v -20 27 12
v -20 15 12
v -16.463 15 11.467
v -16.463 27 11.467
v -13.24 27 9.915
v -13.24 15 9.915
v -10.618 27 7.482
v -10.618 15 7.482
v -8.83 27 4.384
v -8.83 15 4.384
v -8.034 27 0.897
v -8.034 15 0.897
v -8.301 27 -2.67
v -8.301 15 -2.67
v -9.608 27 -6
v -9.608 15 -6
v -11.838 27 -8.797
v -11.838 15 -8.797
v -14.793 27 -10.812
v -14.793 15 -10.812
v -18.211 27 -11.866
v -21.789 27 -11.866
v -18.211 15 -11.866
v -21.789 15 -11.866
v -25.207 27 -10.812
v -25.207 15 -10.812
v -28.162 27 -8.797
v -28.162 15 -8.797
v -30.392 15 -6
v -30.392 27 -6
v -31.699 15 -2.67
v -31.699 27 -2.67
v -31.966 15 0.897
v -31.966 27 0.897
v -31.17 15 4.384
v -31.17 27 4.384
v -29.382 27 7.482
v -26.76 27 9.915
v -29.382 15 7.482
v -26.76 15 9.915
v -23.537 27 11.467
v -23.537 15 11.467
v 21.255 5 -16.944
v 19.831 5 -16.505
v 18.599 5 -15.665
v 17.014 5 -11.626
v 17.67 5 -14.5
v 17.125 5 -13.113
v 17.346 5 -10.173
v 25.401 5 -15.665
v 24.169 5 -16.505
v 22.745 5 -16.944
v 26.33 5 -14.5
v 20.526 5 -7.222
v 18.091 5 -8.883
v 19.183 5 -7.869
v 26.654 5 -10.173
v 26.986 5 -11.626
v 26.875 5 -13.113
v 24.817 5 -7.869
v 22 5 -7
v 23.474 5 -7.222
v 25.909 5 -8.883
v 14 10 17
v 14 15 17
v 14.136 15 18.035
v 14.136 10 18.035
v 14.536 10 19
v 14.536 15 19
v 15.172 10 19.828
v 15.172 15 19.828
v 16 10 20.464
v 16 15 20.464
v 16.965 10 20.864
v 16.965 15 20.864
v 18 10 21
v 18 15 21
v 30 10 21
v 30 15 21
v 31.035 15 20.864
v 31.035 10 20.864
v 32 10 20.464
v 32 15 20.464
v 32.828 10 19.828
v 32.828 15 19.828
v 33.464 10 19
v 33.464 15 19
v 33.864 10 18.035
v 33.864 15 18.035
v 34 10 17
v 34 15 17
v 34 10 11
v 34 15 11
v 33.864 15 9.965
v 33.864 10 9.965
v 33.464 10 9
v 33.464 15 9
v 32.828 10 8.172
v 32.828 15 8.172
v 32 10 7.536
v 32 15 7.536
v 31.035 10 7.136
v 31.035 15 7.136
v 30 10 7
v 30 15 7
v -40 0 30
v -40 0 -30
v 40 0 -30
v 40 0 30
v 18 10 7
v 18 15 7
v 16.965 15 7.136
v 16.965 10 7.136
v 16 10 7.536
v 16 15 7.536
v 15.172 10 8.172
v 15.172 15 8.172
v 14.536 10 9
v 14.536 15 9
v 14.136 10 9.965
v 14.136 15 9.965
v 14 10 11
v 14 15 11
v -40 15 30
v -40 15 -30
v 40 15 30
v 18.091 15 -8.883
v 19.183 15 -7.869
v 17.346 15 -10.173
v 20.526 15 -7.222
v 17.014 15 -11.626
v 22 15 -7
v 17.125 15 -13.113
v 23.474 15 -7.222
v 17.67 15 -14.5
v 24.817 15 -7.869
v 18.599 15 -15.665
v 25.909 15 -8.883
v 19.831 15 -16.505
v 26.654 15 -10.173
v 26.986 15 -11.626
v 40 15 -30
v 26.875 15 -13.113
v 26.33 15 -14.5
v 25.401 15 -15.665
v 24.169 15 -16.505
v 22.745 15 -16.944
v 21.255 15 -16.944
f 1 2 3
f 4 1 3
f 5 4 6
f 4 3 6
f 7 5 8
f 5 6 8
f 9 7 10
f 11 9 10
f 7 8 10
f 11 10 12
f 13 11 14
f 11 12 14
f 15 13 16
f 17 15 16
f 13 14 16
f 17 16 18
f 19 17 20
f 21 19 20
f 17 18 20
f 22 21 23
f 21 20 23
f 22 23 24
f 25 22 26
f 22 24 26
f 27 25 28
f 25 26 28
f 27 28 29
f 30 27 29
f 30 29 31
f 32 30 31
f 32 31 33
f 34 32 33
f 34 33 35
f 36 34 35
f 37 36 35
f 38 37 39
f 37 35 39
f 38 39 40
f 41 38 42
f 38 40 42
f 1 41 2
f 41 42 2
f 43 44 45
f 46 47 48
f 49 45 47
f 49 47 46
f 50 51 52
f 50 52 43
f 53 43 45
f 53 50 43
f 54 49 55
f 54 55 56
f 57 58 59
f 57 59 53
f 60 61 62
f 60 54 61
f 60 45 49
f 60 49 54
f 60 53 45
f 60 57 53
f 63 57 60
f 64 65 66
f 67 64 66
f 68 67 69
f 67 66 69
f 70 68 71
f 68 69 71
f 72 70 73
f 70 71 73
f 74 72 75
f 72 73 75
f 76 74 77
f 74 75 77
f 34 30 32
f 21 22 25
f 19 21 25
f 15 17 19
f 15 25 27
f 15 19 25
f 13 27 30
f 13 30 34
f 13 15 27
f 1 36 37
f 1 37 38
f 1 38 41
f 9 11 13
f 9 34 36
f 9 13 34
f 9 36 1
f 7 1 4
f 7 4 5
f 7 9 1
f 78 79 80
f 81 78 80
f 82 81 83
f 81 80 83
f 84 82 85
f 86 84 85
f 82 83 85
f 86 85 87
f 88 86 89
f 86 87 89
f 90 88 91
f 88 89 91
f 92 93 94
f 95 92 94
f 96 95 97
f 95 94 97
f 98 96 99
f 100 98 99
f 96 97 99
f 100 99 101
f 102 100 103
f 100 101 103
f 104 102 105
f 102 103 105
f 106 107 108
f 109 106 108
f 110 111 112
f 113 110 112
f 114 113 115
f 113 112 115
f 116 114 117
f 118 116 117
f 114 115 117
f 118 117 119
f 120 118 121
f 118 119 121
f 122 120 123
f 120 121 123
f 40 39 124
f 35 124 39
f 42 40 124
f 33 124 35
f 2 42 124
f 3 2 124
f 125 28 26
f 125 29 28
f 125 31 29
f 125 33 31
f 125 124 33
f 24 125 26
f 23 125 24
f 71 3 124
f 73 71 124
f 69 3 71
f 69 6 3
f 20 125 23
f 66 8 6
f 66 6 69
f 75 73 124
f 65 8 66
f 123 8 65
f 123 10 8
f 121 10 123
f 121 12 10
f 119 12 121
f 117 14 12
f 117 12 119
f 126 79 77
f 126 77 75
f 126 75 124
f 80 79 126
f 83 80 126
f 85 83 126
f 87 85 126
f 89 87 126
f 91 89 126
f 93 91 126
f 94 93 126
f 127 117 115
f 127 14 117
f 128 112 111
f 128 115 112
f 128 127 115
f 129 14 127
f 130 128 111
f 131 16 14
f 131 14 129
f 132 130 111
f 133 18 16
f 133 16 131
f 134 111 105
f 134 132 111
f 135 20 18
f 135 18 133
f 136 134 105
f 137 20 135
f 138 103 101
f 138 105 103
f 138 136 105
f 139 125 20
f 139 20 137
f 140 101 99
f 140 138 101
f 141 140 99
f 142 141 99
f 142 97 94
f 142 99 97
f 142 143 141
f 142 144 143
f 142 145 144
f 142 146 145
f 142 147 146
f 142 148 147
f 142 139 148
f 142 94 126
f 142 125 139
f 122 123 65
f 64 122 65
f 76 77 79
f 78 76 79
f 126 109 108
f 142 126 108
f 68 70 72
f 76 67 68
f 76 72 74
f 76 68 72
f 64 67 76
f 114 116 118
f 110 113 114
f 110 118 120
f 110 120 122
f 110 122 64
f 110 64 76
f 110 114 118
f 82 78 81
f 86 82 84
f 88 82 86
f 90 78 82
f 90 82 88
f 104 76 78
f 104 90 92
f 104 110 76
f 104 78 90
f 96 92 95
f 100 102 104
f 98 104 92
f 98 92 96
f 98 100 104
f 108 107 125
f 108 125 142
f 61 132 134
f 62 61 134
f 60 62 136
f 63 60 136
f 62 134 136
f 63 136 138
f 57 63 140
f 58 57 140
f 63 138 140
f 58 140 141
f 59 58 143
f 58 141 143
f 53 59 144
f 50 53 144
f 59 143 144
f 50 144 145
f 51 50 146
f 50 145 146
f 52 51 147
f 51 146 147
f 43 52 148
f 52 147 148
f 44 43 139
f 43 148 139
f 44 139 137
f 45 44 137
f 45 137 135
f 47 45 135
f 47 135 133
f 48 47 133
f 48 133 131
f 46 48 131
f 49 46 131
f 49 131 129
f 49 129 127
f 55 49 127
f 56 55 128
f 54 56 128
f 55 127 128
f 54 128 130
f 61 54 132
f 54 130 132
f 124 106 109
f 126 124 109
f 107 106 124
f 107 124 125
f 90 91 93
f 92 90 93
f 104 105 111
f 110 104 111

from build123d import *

# Parameters (mm, degrees)
SKETCH1_W           = 80
SKETCH1_H           = 60
BOSS_EXTRUDE1_DEPTH = 15
SKETCH2_R           = 12
BOSS_EXTRUDE2_DEPTH = 12
SKETCH3_R           = 5
CUT_EXTRUDE2_DEPTH  = 10
CUT_EXTRUDE4_DEPTH  = 5


with BuildPart() as part:
    # Sketch1 → Boss-Extrude1 (new body)
    with BuildSketch(Plane(origin=(0, 0, 0), x_dir=(1, 0, 0), z_dir=(0, 1, 0))):
        Rectangle(SKETCH1_W, SKETCH1_H)
    extrude(amount=BOSS_EXTRUDE1_DEPTH)

    # Sketch2 → Boss-Extrude2 (add)
    with BuildSketch(Plane(origin=(0, 15, 0), x_dir=(1, 0, 0), z_dir=(0, 1, 0))):
        with Locations(Location((-20, 0, 0), (0, 0, 270))):
            Circle(SKETCH2_R)
    extrude(amount=BOSS_EXTRUDE2_DEPTH)

    # Sketch3 → Cut-Extrude2 (cut)
    with BuildSketch(Plane(origin=(0, 15, 0), x_dir=(1, 0, 0), z_dir=(0, 1, 0))):
        with Locations(Location((22, 12, 0), (0, 0, 270))):
            Circle(SKETCH3_R)
    extrude(amount=-CUT_EXTRUDE2_DEPTH, mode=Mode.SUBTRACT)

    # Sketch4 → Cut-Extrude4 (cut)
    with BuildSketch(Plane(origin=(0, 15, 0), x_dir=(1, 0, 0), z_dir=(0, 1, 0))):
        with BuildLine():
            Line((18, -21), (30, -21))
            ThreePointArc((30, -21), (32.828427125, -19.828427125), (34, -17))
            Line((34, -17), (34, -11))
            ThreePointArc((34, -11), (32.828427125, -8.171572875), (30, -7))
            Line((30, -7), (18, -7))
            ThreePointArc((18, -7), (15.171572875, -8.171572875), (14, -11))
            Line((14, -11), (14, -17))
            ThreePointArc((14, -17), (15.171572875, -19.828427125), (18, -21))
        make_face()
    extrude(amount=-CUT_EXTRUDE4_DEPTH, mode=Mode.SUBTRACT)


solid = part.part
